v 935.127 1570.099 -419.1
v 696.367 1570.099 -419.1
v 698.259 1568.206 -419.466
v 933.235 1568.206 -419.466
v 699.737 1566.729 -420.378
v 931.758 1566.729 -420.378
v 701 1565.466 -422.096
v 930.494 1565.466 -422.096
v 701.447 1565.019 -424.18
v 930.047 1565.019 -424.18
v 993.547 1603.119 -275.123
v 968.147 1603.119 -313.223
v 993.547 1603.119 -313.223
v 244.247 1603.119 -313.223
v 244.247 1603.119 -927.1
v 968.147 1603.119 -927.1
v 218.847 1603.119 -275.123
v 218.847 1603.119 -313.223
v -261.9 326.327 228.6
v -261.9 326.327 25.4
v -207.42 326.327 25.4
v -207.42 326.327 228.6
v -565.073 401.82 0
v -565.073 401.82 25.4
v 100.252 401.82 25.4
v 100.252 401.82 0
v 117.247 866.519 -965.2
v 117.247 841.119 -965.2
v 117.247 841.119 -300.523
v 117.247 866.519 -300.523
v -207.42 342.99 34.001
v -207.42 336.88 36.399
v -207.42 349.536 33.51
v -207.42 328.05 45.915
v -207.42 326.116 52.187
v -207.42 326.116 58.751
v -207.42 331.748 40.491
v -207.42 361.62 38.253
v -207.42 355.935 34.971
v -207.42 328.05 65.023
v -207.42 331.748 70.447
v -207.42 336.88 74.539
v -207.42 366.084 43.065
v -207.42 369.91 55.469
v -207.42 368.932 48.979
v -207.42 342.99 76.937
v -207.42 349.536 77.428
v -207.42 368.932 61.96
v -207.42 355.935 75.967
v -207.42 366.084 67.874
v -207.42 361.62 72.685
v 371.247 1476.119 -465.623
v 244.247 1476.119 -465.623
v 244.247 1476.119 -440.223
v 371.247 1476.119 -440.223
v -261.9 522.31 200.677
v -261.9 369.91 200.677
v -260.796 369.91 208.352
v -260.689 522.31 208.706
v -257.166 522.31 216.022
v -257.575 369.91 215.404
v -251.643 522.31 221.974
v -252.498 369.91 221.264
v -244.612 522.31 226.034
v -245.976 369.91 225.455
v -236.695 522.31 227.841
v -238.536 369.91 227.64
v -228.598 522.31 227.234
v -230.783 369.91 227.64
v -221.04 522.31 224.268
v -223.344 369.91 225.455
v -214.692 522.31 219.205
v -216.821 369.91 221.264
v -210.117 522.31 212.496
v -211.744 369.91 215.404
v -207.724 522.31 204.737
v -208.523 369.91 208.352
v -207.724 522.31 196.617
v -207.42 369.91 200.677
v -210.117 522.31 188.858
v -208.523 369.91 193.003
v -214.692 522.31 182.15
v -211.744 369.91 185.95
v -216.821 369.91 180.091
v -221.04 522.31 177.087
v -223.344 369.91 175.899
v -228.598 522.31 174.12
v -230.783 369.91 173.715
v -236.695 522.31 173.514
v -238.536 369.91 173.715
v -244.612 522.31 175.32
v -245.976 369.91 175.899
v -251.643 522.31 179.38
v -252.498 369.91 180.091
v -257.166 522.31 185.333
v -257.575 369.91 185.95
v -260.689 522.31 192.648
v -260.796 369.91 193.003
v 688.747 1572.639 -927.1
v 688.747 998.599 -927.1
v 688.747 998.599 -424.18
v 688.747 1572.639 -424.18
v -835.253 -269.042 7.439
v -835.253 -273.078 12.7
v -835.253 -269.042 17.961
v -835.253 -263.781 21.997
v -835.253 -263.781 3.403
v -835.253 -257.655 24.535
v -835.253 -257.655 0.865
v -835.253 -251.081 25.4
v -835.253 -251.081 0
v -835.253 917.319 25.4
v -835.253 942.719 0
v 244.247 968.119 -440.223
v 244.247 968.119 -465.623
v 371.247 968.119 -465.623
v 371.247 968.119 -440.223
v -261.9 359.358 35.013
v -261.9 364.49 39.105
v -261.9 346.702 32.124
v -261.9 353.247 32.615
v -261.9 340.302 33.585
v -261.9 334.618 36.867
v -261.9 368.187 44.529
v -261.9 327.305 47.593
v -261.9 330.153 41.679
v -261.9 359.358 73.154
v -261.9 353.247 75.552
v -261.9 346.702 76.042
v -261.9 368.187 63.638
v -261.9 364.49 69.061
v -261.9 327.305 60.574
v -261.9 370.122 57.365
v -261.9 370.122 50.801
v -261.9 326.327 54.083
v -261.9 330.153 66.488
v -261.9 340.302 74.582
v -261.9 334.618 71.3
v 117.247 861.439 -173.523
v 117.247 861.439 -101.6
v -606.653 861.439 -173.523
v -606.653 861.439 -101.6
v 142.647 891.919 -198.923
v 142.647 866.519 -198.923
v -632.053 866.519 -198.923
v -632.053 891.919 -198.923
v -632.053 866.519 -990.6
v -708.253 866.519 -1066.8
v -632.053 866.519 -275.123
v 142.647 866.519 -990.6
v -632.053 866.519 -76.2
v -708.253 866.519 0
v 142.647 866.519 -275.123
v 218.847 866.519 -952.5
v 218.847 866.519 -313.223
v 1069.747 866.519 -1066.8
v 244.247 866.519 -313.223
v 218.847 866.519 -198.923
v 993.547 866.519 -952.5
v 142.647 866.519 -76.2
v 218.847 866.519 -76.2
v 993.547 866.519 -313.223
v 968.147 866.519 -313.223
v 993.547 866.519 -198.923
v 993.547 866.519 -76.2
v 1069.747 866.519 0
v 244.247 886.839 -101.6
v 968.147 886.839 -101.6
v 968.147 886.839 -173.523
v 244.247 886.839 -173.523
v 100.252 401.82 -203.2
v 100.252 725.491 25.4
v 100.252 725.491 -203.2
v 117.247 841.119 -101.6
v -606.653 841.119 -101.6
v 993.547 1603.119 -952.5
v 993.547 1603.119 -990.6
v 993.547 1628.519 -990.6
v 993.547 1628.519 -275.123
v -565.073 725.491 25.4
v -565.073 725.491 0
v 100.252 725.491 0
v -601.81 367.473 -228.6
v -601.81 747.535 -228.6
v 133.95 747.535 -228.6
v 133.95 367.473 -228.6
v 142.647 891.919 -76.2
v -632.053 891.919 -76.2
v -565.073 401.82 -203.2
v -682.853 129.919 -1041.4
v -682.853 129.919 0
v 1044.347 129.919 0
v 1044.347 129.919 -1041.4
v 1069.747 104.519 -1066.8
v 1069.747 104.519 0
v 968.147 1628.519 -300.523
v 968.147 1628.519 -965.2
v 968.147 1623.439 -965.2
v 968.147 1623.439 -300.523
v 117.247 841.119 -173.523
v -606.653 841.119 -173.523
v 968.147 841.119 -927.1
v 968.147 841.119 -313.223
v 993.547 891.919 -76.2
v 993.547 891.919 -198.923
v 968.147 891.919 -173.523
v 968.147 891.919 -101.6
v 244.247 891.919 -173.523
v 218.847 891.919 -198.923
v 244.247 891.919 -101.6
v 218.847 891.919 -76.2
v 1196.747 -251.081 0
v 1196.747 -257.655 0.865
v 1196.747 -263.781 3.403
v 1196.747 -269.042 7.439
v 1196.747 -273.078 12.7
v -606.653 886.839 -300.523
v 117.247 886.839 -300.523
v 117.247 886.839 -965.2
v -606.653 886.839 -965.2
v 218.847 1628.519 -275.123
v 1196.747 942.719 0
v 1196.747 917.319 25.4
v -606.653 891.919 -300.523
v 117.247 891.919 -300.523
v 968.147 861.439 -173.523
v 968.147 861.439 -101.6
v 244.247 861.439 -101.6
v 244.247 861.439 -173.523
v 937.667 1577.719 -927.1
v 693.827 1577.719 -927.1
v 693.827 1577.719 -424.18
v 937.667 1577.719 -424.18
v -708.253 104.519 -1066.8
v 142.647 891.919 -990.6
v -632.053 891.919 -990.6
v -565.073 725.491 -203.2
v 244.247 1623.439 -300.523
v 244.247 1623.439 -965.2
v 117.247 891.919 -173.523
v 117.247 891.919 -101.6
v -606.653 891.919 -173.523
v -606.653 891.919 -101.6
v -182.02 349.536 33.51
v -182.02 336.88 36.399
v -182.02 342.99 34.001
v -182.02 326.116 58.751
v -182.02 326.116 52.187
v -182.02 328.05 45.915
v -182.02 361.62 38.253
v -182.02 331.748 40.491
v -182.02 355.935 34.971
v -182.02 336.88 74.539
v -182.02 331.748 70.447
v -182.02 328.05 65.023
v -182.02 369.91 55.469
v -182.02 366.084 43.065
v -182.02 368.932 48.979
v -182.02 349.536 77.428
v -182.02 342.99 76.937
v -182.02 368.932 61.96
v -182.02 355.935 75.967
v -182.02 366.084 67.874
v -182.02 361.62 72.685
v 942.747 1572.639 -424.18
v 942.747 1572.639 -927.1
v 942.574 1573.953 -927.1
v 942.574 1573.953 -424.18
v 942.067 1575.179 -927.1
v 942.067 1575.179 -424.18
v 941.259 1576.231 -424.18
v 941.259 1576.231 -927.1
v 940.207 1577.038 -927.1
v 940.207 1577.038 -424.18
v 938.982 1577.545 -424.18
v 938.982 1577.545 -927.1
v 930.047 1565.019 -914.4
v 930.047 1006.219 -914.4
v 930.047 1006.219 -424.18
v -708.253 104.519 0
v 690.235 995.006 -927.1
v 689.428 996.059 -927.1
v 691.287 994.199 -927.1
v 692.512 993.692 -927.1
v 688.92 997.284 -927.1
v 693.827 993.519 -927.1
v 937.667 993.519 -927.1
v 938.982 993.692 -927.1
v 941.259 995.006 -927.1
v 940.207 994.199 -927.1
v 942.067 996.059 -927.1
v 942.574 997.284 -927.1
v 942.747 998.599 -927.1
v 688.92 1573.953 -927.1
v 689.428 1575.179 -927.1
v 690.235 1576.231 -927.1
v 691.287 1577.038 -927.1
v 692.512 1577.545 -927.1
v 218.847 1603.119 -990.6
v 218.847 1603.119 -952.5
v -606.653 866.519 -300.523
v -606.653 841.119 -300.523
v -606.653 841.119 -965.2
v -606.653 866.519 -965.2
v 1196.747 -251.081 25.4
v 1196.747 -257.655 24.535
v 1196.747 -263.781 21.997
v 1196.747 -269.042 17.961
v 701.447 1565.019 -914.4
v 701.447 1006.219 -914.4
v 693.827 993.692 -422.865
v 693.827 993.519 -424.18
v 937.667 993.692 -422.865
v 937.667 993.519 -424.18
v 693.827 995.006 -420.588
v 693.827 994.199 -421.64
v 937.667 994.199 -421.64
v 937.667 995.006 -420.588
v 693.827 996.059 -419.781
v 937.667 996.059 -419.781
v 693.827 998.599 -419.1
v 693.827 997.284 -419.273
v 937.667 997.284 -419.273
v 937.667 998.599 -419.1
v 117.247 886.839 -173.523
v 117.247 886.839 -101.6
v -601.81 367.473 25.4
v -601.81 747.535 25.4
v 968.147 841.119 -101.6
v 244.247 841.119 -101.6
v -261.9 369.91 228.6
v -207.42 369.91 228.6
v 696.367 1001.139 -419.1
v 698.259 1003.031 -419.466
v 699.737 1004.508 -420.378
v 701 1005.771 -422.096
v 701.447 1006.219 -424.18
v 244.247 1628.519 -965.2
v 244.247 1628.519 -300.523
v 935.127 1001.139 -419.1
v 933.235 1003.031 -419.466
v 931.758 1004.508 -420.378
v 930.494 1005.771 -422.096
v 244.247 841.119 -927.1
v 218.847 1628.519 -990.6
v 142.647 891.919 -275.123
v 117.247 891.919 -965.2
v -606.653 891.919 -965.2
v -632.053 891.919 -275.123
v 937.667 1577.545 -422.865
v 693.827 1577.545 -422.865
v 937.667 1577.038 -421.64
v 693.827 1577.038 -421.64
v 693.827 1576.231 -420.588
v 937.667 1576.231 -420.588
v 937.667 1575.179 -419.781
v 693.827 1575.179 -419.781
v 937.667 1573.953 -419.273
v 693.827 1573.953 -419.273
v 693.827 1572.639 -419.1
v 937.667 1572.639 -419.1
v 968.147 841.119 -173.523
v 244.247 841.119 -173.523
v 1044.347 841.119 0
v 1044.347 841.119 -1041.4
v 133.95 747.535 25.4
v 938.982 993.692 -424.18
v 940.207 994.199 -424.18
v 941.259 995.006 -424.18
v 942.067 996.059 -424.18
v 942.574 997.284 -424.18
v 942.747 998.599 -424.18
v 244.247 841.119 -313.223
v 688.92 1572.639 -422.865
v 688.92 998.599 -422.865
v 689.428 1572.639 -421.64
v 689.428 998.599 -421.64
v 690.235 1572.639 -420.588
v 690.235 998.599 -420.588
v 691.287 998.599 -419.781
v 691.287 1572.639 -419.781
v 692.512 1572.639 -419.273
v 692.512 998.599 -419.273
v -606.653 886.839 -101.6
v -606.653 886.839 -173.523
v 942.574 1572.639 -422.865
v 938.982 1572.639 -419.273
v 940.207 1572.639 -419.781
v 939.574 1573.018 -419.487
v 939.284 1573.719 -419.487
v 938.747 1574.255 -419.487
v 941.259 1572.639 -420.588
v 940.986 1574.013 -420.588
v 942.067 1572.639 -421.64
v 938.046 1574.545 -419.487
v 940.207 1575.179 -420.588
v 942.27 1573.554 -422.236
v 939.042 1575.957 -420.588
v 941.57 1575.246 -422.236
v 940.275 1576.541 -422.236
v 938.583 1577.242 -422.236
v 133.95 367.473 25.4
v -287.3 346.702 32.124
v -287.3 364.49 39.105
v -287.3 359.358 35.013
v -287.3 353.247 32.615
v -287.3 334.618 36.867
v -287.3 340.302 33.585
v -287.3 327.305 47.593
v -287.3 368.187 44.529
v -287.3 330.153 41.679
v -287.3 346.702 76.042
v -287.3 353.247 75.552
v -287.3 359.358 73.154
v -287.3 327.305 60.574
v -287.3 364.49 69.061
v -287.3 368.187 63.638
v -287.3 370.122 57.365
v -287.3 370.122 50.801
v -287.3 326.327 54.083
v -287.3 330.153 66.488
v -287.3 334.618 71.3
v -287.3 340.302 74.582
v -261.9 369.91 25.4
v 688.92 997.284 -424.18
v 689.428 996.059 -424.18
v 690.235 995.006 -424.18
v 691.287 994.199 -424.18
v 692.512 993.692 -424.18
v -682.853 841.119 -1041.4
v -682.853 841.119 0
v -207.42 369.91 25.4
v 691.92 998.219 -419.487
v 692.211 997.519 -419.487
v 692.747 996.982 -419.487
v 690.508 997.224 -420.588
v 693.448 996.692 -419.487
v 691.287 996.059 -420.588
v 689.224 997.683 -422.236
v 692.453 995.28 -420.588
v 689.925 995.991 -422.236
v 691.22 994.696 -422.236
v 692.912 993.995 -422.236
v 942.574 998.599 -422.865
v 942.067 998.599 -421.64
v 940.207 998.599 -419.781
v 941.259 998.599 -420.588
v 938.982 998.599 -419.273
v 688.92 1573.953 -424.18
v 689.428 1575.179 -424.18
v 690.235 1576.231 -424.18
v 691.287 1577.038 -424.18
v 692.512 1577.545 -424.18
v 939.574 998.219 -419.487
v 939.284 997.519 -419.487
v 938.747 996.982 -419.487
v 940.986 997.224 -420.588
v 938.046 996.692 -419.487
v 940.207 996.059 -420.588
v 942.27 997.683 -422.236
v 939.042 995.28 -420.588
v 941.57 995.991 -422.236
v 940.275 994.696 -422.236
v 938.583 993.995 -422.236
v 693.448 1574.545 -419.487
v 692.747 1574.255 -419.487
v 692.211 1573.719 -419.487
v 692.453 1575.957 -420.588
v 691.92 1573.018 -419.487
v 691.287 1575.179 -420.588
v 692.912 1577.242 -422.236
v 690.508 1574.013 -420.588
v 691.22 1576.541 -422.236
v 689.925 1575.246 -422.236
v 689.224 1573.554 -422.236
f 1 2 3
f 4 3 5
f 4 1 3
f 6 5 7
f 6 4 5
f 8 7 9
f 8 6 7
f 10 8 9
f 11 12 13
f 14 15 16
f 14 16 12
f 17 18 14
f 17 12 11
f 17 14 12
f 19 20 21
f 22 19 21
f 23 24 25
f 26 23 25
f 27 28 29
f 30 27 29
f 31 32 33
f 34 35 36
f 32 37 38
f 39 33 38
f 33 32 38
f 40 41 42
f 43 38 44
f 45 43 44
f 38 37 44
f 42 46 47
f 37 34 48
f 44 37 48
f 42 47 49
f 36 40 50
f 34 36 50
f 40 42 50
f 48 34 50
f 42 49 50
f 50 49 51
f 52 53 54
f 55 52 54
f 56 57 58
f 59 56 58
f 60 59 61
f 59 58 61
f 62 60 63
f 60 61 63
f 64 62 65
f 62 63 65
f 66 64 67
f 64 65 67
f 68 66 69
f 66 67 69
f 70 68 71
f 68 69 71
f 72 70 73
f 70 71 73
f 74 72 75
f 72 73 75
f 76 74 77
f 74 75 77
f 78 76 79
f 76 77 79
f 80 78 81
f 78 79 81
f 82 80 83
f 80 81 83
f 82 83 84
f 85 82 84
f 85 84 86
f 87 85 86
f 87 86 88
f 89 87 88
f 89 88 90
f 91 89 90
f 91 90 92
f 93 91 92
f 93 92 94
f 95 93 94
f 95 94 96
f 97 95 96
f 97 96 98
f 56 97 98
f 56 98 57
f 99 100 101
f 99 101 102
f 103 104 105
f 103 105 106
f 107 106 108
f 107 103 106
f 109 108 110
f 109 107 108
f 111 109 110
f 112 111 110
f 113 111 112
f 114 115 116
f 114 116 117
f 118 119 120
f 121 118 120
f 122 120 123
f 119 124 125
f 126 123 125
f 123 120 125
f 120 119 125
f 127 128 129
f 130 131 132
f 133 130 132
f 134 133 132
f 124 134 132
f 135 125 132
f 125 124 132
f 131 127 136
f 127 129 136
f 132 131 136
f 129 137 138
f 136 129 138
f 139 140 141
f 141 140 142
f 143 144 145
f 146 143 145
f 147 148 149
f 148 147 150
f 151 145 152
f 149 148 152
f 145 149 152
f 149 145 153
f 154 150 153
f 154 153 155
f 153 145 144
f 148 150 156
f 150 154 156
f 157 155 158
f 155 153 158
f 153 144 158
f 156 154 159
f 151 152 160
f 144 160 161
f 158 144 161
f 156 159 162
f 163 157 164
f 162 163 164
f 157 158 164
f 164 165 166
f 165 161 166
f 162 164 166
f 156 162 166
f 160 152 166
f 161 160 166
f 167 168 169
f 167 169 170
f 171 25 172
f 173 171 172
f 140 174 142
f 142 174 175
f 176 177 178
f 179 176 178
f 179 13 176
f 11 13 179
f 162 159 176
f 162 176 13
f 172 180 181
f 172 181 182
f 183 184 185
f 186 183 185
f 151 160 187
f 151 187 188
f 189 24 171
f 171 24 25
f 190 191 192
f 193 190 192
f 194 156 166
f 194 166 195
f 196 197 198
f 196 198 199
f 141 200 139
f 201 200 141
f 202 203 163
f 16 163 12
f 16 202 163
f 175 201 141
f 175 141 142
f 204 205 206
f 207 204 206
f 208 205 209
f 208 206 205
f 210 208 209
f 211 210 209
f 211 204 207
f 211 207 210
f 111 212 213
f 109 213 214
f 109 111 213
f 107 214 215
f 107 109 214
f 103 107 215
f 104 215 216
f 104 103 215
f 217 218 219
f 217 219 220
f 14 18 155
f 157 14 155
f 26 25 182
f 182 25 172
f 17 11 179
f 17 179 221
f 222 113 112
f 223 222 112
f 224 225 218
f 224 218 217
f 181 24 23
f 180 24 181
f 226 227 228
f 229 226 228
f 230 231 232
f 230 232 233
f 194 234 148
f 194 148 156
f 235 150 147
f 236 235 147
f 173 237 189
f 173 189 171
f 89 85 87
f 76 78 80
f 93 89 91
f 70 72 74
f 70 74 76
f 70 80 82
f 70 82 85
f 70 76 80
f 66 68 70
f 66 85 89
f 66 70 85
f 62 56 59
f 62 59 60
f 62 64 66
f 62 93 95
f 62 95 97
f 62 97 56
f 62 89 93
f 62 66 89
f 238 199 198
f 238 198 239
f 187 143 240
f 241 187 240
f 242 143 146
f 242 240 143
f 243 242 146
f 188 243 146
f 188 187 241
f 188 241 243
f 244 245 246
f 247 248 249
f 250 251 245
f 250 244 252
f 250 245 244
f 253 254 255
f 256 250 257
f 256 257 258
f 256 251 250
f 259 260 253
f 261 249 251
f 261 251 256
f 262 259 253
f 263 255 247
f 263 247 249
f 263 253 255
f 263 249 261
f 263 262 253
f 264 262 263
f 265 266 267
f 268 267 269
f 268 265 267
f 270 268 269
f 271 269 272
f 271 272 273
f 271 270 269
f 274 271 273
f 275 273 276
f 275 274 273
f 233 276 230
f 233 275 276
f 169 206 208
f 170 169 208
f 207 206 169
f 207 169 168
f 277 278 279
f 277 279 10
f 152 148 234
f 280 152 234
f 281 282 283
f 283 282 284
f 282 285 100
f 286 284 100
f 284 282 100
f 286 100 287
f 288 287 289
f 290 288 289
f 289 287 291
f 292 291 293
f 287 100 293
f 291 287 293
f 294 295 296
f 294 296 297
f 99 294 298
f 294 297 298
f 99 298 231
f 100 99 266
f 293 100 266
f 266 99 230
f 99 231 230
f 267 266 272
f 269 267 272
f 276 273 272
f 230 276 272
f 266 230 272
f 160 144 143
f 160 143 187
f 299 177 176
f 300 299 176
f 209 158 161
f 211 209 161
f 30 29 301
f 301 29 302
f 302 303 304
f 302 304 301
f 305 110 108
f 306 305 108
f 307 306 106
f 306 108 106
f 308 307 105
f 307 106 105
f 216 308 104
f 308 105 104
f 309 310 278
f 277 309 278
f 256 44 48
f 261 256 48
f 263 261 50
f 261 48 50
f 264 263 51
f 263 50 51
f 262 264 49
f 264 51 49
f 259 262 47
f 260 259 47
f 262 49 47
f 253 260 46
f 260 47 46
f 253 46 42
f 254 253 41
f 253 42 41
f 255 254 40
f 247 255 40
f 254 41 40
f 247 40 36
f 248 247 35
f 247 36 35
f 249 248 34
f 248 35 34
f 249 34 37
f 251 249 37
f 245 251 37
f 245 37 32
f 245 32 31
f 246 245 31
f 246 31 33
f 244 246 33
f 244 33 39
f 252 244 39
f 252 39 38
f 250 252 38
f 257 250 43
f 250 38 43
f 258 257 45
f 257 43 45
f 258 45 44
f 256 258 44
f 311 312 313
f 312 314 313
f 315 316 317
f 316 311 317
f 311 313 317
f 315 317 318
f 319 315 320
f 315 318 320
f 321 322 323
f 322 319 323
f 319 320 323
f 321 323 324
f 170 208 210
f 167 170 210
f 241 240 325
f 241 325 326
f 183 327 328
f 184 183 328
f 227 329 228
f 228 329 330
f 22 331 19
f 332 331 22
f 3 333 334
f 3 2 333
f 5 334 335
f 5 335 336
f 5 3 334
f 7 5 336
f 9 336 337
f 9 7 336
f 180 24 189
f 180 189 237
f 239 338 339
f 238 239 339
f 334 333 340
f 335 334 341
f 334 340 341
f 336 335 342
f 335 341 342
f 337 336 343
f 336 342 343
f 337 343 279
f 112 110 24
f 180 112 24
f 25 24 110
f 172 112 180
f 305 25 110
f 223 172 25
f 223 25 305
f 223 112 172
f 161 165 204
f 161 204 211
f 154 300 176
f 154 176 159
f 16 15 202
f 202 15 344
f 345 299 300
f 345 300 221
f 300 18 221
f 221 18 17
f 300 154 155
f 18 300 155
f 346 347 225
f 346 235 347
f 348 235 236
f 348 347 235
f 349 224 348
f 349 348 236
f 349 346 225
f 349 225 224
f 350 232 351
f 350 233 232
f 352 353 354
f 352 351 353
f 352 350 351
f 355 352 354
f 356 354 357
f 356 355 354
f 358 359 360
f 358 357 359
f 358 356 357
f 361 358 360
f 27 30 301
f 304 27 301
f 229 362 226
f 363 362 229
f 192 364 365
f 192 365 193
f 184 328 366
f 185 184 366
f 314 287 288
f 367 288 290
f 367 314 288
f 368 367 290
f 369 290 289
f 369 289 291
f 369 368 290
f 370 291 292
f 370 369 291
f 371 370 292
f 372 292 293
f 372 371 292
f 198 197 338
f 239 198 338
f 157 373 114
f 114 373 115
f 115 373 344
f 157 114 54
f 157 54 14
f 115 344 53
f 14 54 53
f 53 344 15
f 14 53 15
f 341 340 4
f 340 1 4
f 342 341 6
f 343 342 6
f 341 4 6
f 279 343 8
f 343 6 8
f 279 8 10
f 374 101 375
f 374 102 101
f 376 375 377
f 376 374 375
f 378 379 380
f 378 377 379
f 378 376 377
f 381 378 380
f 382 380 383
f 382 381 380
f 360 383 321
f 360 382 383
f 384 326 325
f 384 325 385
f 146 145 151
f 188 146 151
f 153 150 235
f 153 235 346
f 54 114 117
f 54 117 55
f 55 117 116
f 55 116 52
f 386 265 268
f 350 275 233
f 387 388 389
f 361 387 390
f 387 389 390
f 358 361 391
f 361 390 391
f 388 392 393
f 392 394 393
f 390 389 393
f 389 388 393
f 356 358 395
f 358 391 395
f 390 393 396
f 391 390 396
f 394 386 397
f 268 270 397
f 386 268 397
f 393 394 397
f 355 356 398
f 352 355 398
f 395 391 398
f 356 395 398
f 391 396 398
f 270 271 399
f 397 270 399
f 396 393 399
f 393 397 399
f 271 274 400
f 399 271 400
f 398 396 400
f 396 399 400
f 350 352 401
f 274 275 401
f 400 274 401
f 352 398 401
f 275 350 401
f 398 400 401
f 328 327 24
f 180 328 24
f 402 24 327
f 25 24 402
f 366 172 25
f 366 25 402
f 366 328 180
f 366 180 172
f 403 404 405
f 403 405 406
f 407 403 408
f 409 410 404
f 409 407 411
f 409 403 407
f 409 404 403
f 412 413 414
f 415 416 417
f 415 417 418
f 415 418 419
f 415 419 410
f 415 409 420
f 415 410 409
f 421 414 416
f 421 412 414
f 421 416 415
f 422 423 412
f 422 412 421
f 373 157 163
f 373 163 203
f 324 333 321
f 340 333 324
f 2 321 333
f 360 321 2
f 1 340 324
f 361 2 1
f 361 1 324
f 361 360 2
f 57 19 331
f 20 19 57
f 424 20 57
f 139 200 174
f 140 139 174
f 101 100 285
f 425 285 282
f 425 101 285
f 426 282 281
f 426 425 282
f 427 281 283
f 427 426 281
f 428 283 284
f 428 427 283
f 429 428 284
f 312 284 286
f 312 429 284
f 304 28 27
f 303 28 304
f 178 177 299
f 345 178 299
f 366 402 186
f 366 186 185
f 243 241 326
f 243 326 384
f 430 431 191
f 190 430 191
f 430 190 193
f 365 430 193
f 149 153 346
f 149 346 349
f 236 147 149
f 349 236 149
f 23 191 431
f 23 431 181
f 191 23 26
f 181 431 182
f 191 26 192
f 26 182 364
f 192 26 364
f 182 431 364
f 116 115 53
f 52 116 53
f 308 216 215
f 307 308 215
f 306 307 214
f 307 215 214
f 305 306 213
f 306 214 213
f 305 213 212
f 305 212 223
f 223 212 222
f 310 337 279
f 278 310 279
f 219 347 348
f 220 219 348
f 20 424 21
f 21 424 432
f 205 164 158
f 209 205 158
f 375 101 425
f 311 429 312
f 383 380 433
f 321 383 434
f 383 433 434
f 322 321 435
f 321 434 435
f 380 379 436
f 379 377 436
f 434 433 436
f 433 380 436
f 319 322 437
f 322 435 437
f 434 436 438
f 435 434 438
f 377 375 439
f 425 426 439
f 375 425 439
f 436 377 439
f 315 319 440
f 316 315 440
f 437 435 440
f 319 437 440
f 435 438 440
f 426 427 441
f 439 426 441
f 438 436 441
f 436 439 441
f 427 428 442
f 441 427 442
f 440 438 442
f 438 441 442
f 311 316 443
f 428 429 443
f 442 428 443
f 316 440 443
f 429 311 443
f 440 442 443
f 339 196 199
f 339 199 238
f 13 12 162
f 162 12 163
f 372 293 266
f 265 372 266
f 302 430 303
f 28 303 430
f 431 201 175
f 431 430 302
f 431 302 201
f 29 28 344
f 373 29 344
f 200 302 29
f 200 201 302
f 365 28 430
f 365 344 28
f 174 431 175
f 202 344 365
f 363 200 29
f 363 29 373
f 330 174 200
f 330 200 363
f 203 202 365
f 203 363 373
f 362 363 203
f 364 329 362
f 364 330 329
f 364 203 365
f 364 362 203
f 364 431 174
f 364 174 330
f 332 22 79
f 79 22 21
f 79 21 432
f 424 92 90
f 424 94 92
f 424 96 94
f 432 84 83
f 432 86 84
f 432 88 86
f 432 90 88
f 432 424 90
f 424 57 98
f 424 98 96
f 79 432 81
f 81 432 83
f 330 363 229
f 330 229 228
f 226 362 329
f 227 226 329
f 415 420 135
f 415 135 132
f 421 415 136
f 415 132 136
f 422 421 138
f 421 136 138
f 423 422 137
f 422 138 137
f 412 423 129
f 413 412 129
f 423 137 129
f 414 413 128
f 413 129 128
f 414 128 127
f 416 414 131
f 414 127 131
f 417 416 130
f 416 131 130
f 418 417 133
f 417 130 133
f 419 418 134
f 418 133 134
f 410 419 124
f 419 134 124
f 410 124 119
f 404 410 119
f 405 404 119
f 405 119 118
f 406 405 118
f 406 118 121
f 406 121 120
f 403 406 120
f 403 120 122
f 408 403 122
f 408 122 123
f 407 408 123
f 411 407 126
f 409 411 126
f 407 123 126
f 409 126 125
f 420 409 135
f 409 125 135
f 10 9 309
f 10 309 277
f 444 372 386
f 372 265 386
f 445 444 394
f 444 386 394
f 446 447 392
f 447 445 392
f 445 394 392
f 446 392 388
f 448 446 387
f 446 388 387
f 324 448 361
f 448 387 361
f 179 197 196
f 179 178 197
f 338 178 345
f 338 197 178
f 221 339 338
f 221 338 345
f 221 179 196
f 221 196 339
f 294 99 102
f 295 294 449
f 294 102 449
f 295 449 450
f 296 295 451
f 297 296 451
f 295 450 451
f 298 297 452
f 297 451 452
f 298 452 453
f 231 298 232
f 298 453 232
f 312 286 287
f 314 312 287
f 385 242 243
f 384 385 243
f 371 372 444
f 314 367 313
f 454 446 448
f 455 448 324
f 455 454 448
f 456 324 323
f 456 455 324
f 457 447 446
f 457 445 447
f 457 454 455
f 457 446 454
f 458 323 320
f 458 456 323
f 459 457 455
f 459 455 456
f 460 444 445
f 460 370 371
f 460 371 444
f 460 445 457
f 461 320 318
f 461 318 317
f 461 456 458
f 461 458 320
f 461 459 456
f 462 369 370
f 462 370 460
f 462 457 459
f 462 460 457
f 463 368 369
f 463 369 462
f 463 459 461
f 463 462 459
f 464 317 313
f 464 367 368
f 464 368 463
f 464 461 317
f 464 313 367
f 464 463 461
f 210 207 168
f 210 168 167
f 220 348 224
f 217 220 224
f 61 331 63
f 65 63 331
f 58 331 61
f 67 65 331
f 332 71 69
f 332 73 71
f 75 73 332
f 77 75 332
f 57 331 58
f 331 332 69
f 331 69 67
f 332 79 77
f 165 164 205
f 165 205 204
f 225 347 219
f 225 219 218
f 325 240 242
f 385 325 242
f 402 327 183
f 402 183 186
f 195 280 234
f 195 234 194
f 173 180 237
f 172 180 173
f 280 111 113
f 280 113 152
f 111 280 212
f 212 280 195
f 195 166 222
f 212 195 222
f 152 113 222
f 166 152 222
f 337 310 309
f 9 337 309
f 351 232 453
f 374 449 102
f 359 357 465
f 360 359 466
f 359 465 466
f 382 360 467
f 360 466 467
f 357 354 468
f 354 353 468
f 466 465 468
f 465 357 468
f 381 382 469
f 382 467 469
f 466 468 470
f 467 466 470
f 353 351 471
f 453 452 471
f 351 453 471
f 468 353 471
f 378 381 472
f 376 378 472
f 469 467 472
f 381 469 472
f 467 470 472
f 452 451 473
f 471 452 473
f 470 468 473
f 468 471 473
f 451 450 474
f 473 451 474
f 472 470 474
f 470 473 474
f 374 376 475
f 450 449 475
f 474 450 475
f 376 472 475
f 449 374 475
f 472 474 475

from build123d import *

# Parameters (mm, degrees)
F0_W         = 2032
F0_H         = 1270
F1_DEPTH     = 25.4
F2_W         = 1778
F2_H         = 762
F3_DEPTH     = 1066.8
F4_W         = 774.7
F4_H         = 122.7232557205
F5_DEPTH     = 25.4
F6_W         = 723.9
F6_H         = 71.9232557205
F7_DEPTH     = 5.08
F8_W         = 774.7
F8_H         = 715.4767442795
F9_DEPTH     = 25.4
F10_DEPTH    = 762
F11_W        = 736.6
F11_H        = 38.1
F12_DEPTH    = 787.4
F13_T        = -25.4
F14_W        = 723.9
F14_H        = 664.6767442795
F15_DEPTH    = 5.08
F16_W        = 723.9
F16_H        = 664.6767442795
F17_DEPTH    = 5.08
F18_T1_DEPTH = 2159
F19_T1_DEPTH = 2423.924487366
F20_W        = 508
F20_H        = 25.4
F21_DEPTH    = 127
F23_W        = 254
F23_H        = 584.2
F24_DEPTH    = 508
F25_T        = -12.7
F26_R        = 5.08
F27_W        = 735.7604503632
F27_H        = 380.0623416901
F28_DEPTH    = 254
F29_W        = 665.324151516
F29_H        = 323.6712217331
F30_DEPTH    = 228.6
F31_W        = 54.479598999
F31_H        = 43.5836911201
F32_DEPTH    = 203.2
F33_R        = 27.2397994995
F34_DEPTH    = 152.4
F35_R        = 22.0206677914
F36_DEPTH    = 25.4
F37_R        = 22.0203995705
F38_DEPTH    = 25.4


# Not quite as in the source:
# - a fillet or chamfer that OpenCascade refuses, or shapes differently, is made with other operations: its cross-section is extruded or revolved along the edge and cut away or added
# - a shell that OpenCascade refuses in one call is made with other operations: the cavity is built on its own and cut out


with BuildPart() as f1:
    # F0 (on Top) → F1 (new body)
    with BuildSketch(Plane.XY):
        with Locations((180.7471609741, 358.5185925256)):
            Rectangle(F0_W, F0_H)
    extrude(amount=F1_DEPTH)

    # F2 (on face) → F3 (join)
    with BuildSketch(Plane(origin=(0, 0, 0), x_dir=(1, 0, 0), z_dir=(0, 0, -1))):
        with Locations((180.7471609741, -485.5185925256)):
            Rectangle(F2_W, F2_H)
    extrude(amount=F3_DEPTH)

    # F4 (on face) → F5 (join)
    with BuildSketch(Plane(origin=(0, 866.5185925256, 0), x_dir=(-1, 0, 0), z_dir=(0, 1, 0))):
        with Locations((-606.1971609741, -137.5616278603)):
            Rectangle(F4_W, F4_H)
        with Locations((244.7028390259, -137.5616278603)):
            Rectangle(F4_W, F4_H)
    extrude(amount=F5_DEPTH)

    # F6 (on face) → F7 (cut)
    with BuildSketch(Plane(origin=(0, 891.9185925256, 0), x_dir=(-1, 0, 0), z_dir=(0, 1, 0))):
        with Locations((-606.1971609741, -137.5616278603)):
            Rectangle(F6_W, F6_H)
        with Locations((244.7028390259, -137.5616278603)):
            Rectangle(F6_W, F6_H)
    extrude(amount=-F7_DEPTH, mode=Mode.SUBTRACT)

    # F8 (on face) → F9 (join)
    with BuildSketch(Plane(origin=(0, 866.5185925256, 0), x_dir=(-1, 0, 0), z_dir=(0, 1, 0))):
        with Locations((244.7028390259, -632.8616278603)):
            Rectangle(F8_W, F8_H)
    extrude(amount=F9_DEPTH)

    # F8 (on face) → F10 (join)
    with BuildSketch(Plane(origin=(0, 866.5185925256, 0), x_dir=(-1, 0, 0), z_dir=(0, 1, 0))):
        with Locations((-606.1971609741, -632.8616278603)):
            Rectangle(F8_W, F8_H)
    extrude(amount=F10_DEPTH)

    # F11 (on face) → F12 (cut)
    with BuildSketch(Plane(origin=(218.8471609741, 0, 0), x_dir=(0, -1, 0), z_dir=(-1, 0, 0))):
        with Locations((-1234.8185925256, -294.1732557205)):
            Rectangle(F11_W, F11_H)
        with Locations((-1234.8185925256, -971.55)):
            Rectangle(F11_W, F11_H)
    extrude(amount=-F12_DEPTH, mode=Mode.SUBTRACT)

    # F13: a shell. OpenCascade refuses it in one call, so the cavity is built on its own and cut out:
    # the body offset inwards by the wall thickness, plus a prism from it out through each open face.
    f13_core = offset(f1.part, amount=F13_T, kind=Kind.INTERSECTION, mode=Mode.PRIVATE)
    f13_exits = [f13_core.faces().sort_by_distance(p)[0] for p in [
        (606.197161, 1222.118593, -338.623256),
    ]]
    add(f13_core, mode=Mode.SUBTRACT)
    extrude(f13_exits, amount=-F13_T, mode=Mode.SUBTRACT)

    # F14 (on face) → F15 (cut)
    with BuildSketch(Plane(origin=(0, 891.9185925256, 0), x_dir=(-1, 0, 0), z_dir=(0, 1, 0))):
        with Locations((244.7028390259, -632.8616278603)):
            Rectangle(F14_W, F14_H)
    extrude(amount=-F15_DEPTH, mode=Mode.SUBTRACT)

    # F16 (on face) → F17 (cut)
    with BuildSketch(Plane(origin=(0, 1628.5185925256, 0), x_dir=(-1, 0, 0), z_dir=(0, 1, 0))):
        with Locations((-606.1971609741, -632.8616278603)):
            Rectangle(F16_W, F16_H)
    extrude(amount=-F17_DEPTH, mode=Mode.SUBTRACT)

    # F18: fillet of radius 25.4 on 2 edges, made by hand

    # F18_s2 → F18_t1 (cut)
    with BuildSketch(Plane.YZ.offset(-898.7528390259)):
        with BuildLine():
            ThreePointArc((-251.0814074744, 25.4), (-269.0419197166, 17.9605122421), (-276.4814074744, 0))
            Line((-276.4814074744, 0), (-276.4814074744, 25.4))
            Line((-276.4814074744, 25.4), (-251.0814074744, 25.4))
        make_face()
        with BuildLine():
            ThreePointArc((-251.0814074744, 0), (-269.0419197166, 7.4394877579), (-276.4814074744, 25.4))
            Line((-276.4814074744, 25.4), (-276.4814074744, 0))
            Line((-276.4814074744, 0), (-251.0814074744, 0))
        make_face()
    extrude(amount=F18_T1_DEPTH, mode=Mode.SUBTRACT)

    # F19: chamfer of 76.2 on 1 edges, made by hand

    # F19_s2 → F19_t1 (cut)
    with BuildSketch(Plane.YZ.offset(-1031.2150827089)):
        Polygon((993.5185925256, -50.8), (917.3185925256, 25.4), (993.5185925256, 25.4), align=None)
    extrude(amount=F19_T1_DEPTH, mode=Mode.SUBTRACT)

    # F20 (on face) → F21 (join)
    with BuildSketch(Plane.YZ.offset(244.2471609741)):
        with Locations((1222.1185925256, -452.9232557205)):
            Rectangle(F20_W, F20_H)
    extrude(amount=F21_DEPTH)


with BuildPart() as f24:
    # F23 (on offset) → F24 (new body)
    with BuildSketch(Plane.XY.offset(-927.1)):
        with Locations((815.7471609741, 1285.6185925256)):
            Rectangle(F23_W, F23_H)
    extrude(amount=F24_DEPTH)

    # F25
    f25_openings = [f24.faces().sort_by_distance(p)[0] for p in [
        (815.747161, 1285.618593, -419.1),
    ]]
    offset(amount=F25_T, openings=f25_openings)

    # F26
    f26_edges = [f24.edges().sort_by_distance(p)[0] for p in [
        (688.747161, 1577.718593, -673.1),
        (942.747161, 1577.718593, -673.1),
        (688.747161, 993.518593, -673.1),
        (942.747161, 993.518593, -673.1),
        (942.747161, 1285.618593, -419.1),
        (930.047161, 1285.618593, -419.1),
        (815.747161, 1577.718593, -419.1),
        (815.747161, 1565.018593, -419.1),
        (701.447161, 1285.618593, -419.1),
        (688.747161, 1285.618593, -419.1),
        (815.747161, 1006.218593, -419.1),
        (815.747161, 993.518593, -419.1),
    ]]
    fillet(f26_edges, radius=F26_R)


with BuildPart() as f28:
    # F27 (on face) → F28 (new body)
    with BuildSketch(Plane.XY.offset(25.4)):
        with Locations((-233.930170536, 557.5037002563)):
            Rectangle(F27_W, F27_H)
    extrude(amount=-F28_DEPTH)


with BuildPart() as f30_tool:
    # F29 (on face) → F30 (new body)
    with BuildSketch(Plane.XY.offset(25.4)):
        with Locations((-232.4104309082, 563.6555552483)):
            Rectangle(F29_W, F29_H)
    extrude(amount=-F30_DEPTH)


with BuildPart() as f1_1:
    add(f1.part)

    # F30: cut by f30_tool
    add(f30_tool.part, mode=Mode.SUBTRACT)


with BuildPart() as f28_1:
    add(f28.part)

    # F30: cut by f30_tool
    add(f30_tool.part, mode=Mode.SUBTRACT)


with BuildPart() as f32:
    # F31 (on face) → F32 (new body)
    with BuildSketch(Plane.XY.offset(25.4)):
        with Locations((-234.6597015858, 348.1185734272)):
            Rectangle(F31_W, F31_H)
    extrude(amount=F32_DEPTH)

    # F33 (on face) → F34 (join)
    with BuildSketch(Plane(origin=(0, 369.9104189873, 0), x_dir=(-1, 0, 0), z_dir=(0, 1, 0))):
        with Locations((234.6597015858, 200.67730546)):
            Circle(F33_R)
    extrude(amount=F34_DEPTH)


with BuildPart() as f36:
    # F35 (on face) → F36 (new body)
    with BuildSketch(Plane(origin=(-261.8995010853, 0, 0), x_dir=(0, -1, 0), z_dir=(-1, 0, 0))):
        with Locations((-348.3473956585, 54.0832839906)):
            Circle(F35_R)
    extrude(amount=F36_DEPTH)


with BuildPart() as f38:
    # F37 (on face) → F38 (new body)
    with BuildSketch(Plane.YZ.offset(-207.4199020863)):
        with Locations((347.8900194168, 55.4691664875)):
            Circle(F37_R)
    extrude(amount=F38_DEPTH)


solid = Compound([f24.part, f1_1.part, f28_1.part, f32.part, f36.part, f38.part])
